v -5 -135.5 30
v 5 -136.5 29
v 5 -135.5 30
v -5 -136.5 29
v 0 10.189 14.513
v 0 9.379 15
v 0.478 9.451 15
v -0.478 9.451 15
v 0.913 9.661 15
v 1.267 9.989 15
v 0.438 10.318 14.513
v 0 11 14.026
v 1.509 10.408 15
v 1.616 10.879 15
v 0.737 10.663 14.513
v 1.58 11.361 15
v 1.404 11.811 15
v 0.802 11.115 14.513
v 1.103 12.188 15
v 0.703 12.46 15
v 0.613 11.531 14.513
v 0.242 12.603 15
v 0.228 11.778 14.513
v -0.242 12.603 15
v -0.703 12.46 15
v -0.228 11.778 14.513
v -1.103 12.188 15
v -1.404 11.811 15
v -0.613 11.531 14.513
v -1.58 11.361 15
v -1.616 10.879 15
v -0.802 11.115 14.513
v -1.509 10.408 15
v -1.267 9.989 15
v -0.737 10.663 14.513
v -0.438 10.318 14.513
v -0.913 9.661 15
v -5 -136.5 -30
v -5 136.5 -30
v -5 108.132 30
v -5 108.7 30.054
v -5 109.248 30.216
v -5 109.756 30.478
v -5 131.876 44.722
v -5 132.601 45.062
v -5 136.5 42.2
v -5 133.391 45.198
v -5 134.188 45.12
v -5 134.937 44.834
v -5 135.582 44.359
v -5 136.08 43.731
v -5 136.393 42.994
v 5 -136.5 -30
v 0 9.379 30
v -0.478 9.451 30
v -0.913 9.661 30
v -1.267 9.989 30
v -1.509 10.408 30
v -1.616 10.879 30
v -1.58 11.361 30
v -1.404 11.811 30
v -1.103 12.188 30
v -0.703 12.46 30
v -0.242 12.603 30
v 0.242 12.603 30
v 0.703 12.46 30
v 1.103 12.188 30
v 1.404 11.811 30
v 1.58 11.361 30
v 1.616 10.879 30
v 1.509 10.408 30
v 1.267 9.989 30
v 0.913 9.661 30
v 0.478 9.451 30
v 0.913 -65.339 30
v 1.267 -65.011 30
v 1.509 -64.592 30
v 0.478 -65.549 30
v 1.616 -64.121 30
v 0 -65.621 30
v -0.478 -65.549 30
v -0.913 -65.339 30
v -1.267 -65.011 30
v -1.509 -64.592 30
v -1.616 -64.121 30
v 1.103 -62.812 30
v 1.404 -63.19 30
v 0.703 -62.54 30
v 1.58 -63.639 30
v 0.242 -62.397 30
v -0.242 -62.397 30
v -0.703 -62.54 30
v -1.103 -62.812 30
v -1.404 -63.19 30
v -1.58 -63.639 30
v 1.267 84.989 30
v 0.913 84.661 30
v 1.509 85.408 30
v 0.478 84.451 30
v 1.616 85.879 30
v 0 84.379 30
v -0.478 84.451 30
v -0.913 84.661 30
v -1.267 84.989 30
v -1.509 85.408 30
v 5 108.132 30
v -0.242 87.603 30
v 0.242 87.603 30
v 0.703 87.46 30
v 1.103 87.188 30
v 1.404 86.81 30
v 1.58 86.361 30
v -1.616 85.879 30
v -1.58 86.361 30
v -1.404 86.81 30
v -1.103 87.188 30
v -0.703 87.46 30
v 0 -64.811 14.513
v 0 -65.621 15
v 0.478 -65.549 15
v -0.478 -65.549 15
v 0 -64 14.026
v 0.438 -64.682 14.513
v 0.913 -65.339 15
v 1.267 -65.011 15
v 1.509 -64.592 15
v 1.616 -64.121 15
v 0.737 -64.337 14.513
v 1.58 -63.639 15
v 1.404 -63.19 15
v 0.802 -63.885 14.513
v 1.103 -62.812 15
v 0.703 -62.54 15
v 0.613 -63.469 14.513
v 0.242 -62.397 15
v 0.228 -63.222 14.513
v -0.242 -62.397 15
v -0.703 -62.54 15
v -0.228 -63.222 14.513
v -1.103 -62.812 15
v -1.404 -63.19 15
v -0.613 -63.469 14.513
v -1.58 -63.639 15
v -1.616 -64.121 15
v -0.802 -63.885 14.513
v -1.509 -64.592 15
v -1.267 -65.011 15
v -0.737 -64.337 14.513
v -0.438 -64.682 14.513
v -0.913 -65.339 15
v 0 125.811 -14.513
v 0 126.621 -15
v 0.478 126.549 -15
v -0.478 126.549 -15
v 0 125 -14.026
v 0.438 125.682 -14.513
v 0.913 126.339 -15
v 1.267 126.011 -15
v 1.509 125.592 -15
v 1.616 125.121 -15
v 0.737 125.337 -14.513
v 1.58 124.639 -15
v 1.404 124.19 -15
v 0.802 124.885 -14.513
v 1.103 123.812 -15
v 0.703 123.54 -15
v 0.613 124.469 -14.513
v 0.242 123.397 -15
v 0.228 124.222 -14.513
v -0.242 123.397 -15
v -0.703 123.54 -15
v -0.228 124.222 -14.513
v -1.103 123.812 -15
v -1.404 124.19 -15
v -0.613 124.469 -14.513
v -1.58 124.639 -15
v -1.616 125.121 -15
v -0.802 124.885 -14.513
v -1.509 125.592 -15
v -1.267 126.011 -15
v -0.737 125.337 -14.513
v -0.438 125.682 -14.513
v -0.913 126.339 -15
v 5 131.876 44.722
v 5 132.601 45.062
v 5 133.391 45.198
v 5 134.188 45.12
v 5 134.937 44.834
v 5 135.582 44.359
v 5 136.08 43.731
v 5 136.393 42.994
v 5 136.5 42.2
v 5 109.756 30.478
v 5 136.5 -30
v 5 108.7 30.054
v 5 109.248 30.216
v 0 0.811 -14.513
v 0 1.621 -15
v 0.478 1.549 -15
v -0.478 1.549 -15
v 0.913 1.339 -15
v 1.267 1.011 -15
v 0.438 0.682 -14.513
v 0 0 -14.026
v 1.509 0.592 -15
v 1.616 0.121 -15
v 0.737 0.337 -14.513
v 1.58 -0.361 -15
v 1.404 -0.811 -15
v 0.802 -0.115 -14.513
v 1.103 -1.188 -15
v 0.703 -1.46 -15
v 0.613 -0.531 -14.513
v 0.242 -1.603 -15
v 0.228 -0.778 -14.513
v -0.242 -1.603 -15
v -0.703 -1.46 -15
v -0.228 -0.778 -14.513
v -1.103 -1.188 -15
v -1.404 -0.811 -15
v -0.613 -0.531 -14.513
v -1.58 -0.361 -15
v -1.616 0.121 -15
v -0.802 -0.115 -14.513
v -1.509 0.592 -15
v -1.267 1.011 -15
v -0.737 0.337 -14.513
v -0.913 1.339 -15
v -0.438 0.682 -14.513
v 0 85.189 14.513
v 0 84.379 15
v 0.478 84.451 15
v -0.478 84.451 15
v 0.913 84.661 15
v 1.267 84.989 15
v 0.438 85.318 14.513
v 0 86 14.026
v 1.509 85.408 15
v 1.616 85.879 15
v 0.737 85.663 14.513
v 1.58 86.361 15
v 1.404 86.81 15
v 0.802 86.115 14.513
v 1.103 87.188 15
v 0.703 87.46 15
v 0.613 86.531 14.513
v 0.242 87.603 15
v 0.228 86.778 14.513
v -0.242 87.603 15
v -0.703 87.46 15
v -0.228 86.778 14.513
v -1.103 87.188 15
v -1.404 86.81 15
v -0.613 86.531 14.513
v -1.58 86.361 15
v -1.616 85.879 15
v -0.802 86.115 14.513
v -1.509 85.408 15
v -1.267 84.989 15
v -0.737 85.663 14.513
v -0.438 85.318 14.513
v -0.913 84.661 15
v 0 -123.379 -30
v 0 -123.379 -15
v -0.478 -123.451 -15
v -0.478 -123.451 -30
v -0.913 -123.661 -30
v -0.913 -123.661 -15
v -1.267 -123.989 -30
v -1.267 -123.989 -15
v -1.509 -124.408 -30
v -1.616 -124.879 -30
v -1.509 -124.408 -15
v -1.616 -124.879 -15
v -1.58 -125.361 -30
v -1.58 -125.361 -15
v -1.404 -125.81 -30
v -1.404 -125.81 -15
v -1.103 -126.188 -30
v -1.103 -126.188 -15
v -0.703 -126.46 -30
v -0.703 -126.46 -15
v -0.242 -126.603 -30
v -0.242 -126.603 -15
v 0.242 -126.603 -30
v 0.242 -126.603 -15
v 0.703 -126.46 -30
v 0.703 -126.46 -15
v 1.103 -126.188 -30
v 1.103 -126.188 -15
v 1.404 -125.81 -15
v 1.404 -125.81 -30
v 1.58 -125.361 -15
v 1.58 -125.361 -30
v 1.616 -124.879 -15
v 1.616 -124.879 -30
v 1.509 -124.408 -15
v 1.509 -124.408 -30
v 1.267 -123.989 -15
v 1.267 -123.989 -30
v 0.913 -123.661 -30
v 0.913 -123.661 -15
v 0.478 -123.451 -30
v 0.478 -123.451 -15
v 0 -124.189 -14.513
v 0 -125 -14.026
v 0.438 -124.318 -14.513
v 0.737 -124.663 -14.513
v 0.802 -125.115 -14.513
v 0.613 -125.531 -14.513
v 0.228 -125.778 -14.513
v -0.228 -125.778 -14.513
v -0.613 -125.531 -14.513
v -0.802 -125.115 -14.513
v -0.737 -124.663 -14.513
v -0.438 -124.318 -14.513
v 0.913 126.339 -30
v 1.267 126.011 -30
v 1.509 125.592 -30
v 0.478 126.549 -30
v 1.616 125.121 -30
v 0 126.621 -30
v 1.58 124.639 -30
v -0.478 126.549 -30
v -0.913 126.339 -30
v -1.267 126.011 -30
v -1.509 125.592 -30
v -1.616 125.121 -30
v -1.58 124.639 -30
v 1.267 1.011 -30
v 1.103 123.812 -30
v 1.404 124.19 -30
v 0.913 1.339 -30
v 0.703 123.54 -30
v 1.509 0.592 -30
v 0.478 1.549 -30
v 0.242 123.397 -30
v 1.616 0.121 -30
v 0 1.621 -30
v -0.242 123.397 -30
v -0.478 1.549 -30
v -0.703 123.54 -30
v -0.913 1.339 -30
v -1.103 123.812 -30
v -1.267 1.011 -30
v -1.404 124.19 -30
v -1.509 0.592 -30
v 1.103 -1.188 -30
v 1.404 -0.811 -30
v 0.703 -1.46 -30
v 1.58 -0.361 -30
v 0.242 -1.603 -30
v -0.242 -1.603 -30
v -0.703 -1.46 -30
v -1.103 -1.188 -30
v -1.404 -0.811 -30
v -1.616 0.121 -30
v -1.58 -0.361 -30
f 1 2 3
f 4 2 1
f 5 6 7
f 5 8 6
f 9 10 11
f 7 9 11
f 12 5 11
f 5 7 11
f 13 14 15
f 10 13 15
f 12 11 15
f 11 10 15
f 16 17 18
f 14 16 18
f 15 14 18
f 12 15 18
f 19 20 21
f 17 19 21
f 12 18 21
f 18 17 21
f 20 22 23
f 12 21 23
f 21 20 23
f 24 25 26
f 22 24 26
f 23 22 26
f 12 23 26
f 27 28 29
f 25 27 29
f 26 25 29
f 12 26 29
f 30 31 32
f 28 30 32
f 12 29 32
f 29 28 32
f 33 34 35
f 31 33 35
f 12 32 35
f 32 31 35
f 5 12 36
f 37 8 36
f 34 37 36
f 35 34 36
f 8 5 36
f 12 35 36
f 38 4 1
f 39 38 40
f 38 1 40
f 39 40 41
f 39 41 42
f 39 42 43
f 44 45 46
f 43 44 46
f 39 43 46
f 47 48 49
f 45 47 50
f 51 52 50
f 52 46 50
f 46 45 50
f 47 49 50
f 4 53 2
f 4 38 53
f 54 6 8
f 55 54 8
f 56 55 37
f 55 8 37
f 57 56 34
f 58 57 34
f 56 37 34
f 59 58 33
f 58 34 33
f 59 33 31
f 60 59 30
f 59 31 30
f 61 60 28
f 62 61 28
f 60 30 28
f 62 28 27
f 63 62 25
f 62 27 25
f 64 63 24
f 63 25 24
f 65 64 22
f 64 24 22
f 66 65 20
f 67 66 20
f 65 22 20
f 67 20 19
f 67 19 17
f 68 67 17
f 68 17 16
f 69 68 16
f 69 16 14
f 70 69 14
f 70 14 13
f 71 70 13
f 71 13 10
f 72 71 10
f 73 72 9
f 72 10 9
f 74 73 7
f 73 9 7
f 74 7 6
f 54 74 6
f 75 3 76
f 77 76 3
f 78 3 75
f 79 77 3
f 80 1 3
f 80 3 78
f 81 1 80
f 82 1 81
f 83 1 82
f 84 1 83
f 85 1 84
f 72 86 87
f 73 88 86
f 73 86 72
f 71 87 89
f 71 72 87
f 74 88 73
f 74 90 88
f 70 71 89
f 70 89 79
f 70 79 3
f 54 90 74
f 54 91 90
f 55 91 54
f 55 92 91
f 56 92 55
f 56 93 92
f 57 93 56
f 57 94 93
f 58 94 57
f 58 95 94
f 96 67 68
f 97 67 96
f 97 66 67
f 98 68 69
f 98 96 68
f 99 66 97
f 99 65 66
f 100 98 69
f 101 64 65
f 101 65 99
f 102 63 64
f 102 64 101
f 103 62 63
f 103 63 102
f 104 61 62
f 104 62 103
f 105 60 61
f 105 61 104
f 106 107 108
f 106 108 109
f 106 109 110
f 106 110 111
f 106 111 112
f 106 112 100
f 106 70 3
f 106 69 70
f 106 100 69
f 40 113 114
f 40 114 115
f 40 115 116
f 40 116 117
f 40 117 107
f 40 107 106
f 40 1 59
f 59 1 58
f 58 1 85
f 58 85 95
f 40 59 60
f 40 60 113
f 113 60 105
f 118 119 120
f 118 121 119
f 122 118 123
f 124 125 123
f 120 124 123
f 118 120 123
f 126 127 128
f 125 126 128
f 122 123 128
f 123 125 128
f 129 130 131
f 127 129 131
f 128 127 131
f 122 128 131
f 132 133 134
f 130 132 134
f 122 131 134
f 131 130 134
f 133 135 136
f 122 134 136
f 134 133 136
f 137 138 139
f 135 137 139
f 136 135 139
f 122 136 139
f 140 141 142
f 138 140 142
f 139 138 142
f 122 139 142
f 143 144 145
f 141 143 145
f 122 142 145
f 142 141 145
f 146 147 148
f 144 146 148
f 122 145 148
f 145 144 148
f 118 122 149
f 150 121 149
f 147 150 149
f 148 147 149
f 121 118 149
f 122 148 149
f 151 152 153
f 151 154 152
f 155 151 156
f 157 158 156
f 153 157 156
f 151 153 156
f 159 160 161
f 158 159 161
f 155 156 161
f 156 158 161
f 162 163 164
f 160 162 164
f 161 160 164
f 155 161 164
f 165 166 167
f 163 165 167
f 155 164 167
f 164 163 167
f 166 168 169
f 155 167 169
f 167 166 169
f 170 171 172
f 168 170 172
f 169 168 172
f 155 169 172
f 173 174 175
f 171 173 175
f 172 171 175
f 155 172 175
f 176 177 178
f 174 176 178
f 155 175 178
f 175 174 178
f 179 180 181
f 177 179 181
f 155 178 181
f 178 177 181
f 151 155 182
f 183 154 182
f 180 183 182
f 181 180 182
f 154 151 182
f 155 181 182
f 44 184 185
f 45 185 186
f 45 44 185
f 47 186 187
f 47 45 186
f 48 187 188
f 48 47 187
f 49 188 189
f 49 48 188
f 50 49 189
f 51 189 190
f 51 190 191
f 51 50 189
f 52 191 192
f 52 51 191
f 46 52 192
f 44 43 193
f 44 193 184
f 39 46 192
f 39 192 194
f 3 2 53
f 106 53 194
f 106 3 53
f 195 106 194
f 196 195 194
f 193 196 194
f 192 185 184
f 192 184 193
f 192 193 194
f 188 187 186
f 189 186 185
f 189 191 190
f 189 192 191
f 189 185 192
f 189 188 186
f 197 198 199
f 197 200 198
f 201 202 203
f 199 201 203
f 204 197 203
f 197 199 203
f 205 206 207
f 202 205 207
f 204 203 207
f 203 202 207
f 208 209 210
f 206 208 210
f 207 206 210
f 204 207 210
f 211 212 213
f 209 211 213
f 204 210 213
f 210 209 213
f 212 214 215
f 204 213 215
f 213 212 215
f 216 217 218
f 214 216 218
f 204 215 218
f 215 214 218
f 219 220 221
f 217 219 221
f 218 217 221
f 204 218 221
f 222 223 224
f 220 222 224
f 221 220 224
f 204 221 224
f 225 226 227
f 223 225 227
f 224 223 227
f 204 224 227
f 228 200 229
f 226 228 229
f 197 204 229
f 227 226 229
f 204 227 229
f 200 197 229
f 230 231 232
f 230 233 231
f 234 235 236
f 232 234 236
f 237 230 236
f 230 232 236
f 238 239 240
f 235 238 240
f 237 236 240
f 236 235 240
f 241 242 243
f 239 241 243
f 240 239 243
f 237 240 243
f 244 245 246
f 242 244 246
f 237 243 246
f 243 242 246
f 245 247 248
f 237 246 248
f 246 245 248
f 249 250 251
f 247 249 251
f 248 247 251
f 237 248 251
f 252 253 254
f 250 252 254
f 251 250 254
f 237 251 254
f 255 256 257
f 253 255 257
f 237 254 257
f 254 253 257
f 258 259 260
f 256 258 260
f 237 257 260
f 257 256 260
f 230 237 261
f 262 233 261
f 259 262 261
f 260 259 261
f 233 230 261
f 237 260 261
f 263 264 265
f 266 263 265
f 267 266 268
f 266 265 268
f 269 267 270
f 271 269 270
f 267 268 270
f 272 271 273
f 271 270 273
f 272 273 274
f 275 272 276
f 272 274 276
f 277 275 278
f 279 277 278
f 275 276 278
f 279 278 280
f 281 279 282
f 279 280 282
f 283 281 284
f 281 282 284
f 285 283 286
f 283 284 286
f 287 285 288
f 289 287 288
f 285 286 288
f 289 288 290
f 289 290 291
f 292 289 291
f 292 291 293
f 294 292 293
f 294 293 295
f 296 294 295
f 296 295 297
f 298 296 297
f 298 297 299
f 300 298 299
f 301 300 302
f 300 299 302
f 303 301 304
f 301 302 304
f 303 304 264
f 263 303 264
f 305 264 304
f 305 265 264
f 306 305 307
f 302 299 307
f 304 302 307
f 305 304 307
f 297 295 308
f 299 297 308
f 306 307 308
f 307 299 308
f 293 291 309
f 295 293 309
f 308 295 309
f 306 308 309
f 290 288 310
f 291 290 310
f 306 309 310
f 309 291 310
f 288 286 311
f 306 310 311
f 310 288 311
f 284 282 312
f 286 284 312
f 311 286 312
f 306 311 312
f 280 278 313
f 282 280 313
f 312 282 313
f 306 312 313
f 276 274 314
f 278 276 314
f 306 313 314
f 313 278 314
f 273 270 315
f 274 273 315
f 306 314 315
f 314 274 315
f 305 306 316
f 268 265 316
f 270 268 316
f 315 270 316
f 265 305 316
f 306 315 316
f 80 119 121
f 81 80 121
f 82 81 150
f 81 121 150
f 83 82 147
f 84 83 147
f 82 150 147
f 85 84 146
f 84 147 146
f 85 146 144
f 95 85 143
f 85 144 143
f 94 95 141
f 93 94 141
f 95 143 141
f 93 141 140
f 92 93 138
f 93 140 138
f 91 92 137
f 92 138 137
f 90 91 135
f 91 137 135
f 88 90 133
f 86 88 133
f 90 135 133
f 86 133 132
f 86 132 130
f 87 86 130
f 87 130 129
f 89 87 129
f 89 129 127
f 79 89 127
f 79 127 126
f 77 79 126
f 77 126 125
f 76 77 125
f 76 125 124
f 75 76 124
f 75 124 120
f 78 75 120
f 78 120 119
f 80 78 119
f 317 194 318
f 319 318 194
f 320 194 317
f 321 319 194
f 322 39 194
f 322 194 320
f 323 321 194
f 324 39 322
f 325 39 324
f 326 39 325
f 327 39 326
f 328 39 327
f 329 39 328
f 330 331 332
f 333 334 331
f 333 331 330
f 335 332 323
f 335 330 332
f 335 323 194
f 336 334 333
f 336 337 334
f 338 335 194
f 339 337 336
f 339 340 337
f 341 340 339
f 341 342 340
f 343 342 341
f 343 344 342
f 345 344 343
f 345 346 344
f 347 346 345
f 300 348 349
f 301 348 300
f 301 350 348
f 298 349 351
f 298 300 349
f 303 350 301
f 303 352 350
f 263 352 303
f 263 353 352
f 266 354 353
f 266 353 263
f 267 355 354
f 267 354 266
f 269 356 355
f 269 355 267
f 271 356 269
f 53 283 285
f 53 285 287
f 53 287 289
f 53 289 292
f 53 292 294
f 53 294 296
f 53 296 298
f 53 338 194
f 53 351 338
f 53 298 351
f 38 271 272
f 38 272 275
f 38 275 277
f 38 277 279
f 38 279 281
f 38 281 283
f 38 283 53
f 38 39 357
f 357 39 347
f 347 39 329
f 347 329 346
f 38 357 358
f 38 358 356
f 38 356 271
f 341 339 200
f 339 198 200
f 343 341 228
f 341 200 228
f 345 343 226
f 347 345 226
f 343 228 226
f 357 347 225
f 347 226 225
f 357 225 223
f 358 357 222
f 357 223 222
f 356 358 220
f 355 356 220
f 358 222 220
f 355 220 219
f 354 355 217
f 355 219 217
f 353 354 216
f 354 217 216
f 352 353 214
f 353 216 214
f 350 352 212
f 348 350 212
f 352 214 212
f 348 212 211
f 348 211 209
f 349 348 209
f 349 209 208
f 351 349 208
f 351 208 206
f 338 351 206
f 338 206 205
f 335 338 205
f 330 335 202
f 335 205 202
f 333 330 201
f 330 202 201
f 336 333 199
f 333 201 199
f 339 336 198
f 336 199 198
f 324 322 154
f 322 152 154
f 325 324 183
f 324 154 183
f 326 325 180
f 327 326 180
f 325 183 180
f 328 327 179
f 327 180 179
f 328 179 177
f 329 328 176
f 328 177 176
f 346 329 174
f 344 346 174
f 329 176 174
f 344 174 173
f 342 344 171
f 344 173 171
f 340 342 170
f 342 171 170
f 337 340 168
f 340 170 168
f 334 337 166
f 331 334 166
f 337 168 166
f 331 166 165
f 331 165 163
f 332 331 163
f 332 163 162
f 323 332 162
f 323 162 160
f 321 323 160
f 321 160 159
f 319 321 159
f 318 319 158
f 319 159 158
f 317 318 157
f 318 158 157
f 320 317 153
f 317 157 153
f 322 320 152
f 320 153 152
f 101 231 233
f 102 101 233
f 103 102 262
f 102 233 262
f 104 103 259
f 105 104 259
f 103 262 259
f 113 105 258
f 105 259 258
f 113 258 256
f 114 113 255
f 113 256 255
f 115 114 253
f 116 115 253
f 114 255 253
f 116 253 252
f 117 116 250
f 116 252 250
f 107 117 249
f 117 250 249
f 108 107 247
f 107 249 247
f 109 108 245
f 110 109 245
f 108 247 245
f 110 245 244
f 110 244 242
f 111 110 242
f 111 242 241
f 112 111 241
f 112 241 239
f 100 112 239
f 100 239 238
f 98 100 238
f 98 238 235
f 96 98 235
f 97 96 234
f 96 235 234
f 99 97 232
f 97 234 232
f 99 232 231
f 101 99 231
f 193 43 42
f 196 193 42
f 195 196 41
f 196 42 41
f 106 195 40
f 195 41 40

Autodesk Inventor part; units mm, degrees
ref_plane "YZ Plane" through (0, 0, 0) normal (1, 0, 0) x (0, 1, 0)
ref_plane "XZ Plane" through (0, 0, 0) normal (0, 1, 0) x (-1, 0, 0)
ref_plane "XY Plane" through (0, 0, 0) normal (0, 0, 1) x (1, 0, 0)
sketch "Sketch1" plane through (0, 0, 0) normal (1, 0, 0) x (0, 1, 0)
  line L0 (-191.1, 0) -> (191.1, 0) construction
  line L1 (0, -45.54) -> (0, 63.24) construction
  line L2 (-136.5, 30) -> (136.5, 30)
  line L3 (136.5, 30) -> (136.5, -30)
  line L4 (136.5, -30) -> (-136.5, -30)
  line L5 (-136.5, -30) -> (-136.5, 30)
  line L6 (109.0139, 30) -> (136.5, 47.7)
  line L7 (136.5, 47.7) -> (136.5, 30)
  circle A0 centre (133.5, 42.1999) radius 3
  circle A1 centre (115.5, 30.6086) radius 3
  line L8 (-136.5, 30) -> (103.5, 30) construction
  line L9 (103.5, 30) -> (103.5, 38) construction
  line L10 (103.5, 38) -> (-136.5, 38) construction
  line L11 (-136.5, 38) -> (-136.5, 30) construction
  line L12 (112.5, 32.2449) -> (112.5, 30)
  circle A2 centre (109.5, 30) radius 3
  circle A3 centre (109.5, 33) radius 3
  line L13 (-56.5, 30) -> (3.5, 30)
  line L14 (3.5, 30) -> (3.5, 6.4132)
  line L15 (3.5, 6.4132) -> (-56.5, 6.4132)
  line L16 (-56.5, 6.4132) -> (-56.5, 30)
  line L17 (-26.5, 6.4132) -> (-26.5, 30) construction
  point P0 (0, 0)
  point P1 (106.5, 30)
  dimension "d6" = 6
  dimension "d1" = 32.78
  dimension "d2" = 6
  dimension "d3" = 8
  dimension "d4" = 240
  dimension "d7" = 60
  dimension "d35" = 147.22
  dimension "d36" = 273
  dimension "d37" = 17.7
  dimension "d38" = 24
  dimension "d39" = 110
  dimension "d40" = 60
extrude "Extrusion1" add sketch "Sketch1" along normal mid plane 10 contours L2 L16 L15 L14 A2 A1 L3 L4 L5 | L2 L14 L15 L16 | L2 A2 | L2 A1 L6 A0 L7 | L6 A3 L2 | L12 A1 L2 | A2 A3 L6 L12 | L2 A3 A2 | A1 L2 | L2 A1 | A0 L6 L7 | A0 | A3 L6 A2 | L6 A3 A2 | L12 L6 A1 picked at (110.4979, 30.6349) picked at (112.1863, 31.9825)
sketch "Sketch2" plane through (-5, -136.5, 30) normal (0, 0, 1) x (1, 0, 0)
  line L0 (5, -54.6) -> (5, 327.6) construction
  line L1 (0, 0) -> (10, 0) projected
  point P0 (5, 136.5)
  point P1 (5, 72.5)
  point P2 (5, 147.5)
  point P3 (5, 222.5)
  dimension "d11" = 72.5
  dimension "d12" = 75
  dimension "d13" = 75
hole "Hole1" at (0, -64, 30) at (0, 11, 30) at (0, 86, 30) direction (0, 0, -1) diameter 3.242 depth 15 tip angle 118 thread size "M4x0.7" class "6H" standard "ISO Metric profile"
sketch "Sketch3" plane through (5, 136.5, -30) normal (0, 0, -1) x (-1, 0, 0)
  line L0 (12, -136.5) -> (-2, -136.5) construction
  line L1 (5, -327.6) -> (5, 54.6) construction
  point P0 (5, -136.5)
  point P1 (5, -261.5)
  point P2 (5, -136.5)
  point P3 (5, -11.5)
  dimension "d21" = 250
hole "Hole2" at (0, -125, -30) at (0, 0, -30) at (0, 125, -30) direction (0, 0, 1) diameter 3.242 depth 15 tip angle 118 thread size "M4x0.7" class "6H" standard "ISO Metric profile"
fillet "Fillet1" radius 3 2 edges at (0, 136.5, 47.7) (0, 109.0139, 30)
chamfer "Chamfer1" distance 1 angle 45 1 edges at (0, -136.5, 30)
properties part number "GRJ-04-102" material "Fenolite OR"
